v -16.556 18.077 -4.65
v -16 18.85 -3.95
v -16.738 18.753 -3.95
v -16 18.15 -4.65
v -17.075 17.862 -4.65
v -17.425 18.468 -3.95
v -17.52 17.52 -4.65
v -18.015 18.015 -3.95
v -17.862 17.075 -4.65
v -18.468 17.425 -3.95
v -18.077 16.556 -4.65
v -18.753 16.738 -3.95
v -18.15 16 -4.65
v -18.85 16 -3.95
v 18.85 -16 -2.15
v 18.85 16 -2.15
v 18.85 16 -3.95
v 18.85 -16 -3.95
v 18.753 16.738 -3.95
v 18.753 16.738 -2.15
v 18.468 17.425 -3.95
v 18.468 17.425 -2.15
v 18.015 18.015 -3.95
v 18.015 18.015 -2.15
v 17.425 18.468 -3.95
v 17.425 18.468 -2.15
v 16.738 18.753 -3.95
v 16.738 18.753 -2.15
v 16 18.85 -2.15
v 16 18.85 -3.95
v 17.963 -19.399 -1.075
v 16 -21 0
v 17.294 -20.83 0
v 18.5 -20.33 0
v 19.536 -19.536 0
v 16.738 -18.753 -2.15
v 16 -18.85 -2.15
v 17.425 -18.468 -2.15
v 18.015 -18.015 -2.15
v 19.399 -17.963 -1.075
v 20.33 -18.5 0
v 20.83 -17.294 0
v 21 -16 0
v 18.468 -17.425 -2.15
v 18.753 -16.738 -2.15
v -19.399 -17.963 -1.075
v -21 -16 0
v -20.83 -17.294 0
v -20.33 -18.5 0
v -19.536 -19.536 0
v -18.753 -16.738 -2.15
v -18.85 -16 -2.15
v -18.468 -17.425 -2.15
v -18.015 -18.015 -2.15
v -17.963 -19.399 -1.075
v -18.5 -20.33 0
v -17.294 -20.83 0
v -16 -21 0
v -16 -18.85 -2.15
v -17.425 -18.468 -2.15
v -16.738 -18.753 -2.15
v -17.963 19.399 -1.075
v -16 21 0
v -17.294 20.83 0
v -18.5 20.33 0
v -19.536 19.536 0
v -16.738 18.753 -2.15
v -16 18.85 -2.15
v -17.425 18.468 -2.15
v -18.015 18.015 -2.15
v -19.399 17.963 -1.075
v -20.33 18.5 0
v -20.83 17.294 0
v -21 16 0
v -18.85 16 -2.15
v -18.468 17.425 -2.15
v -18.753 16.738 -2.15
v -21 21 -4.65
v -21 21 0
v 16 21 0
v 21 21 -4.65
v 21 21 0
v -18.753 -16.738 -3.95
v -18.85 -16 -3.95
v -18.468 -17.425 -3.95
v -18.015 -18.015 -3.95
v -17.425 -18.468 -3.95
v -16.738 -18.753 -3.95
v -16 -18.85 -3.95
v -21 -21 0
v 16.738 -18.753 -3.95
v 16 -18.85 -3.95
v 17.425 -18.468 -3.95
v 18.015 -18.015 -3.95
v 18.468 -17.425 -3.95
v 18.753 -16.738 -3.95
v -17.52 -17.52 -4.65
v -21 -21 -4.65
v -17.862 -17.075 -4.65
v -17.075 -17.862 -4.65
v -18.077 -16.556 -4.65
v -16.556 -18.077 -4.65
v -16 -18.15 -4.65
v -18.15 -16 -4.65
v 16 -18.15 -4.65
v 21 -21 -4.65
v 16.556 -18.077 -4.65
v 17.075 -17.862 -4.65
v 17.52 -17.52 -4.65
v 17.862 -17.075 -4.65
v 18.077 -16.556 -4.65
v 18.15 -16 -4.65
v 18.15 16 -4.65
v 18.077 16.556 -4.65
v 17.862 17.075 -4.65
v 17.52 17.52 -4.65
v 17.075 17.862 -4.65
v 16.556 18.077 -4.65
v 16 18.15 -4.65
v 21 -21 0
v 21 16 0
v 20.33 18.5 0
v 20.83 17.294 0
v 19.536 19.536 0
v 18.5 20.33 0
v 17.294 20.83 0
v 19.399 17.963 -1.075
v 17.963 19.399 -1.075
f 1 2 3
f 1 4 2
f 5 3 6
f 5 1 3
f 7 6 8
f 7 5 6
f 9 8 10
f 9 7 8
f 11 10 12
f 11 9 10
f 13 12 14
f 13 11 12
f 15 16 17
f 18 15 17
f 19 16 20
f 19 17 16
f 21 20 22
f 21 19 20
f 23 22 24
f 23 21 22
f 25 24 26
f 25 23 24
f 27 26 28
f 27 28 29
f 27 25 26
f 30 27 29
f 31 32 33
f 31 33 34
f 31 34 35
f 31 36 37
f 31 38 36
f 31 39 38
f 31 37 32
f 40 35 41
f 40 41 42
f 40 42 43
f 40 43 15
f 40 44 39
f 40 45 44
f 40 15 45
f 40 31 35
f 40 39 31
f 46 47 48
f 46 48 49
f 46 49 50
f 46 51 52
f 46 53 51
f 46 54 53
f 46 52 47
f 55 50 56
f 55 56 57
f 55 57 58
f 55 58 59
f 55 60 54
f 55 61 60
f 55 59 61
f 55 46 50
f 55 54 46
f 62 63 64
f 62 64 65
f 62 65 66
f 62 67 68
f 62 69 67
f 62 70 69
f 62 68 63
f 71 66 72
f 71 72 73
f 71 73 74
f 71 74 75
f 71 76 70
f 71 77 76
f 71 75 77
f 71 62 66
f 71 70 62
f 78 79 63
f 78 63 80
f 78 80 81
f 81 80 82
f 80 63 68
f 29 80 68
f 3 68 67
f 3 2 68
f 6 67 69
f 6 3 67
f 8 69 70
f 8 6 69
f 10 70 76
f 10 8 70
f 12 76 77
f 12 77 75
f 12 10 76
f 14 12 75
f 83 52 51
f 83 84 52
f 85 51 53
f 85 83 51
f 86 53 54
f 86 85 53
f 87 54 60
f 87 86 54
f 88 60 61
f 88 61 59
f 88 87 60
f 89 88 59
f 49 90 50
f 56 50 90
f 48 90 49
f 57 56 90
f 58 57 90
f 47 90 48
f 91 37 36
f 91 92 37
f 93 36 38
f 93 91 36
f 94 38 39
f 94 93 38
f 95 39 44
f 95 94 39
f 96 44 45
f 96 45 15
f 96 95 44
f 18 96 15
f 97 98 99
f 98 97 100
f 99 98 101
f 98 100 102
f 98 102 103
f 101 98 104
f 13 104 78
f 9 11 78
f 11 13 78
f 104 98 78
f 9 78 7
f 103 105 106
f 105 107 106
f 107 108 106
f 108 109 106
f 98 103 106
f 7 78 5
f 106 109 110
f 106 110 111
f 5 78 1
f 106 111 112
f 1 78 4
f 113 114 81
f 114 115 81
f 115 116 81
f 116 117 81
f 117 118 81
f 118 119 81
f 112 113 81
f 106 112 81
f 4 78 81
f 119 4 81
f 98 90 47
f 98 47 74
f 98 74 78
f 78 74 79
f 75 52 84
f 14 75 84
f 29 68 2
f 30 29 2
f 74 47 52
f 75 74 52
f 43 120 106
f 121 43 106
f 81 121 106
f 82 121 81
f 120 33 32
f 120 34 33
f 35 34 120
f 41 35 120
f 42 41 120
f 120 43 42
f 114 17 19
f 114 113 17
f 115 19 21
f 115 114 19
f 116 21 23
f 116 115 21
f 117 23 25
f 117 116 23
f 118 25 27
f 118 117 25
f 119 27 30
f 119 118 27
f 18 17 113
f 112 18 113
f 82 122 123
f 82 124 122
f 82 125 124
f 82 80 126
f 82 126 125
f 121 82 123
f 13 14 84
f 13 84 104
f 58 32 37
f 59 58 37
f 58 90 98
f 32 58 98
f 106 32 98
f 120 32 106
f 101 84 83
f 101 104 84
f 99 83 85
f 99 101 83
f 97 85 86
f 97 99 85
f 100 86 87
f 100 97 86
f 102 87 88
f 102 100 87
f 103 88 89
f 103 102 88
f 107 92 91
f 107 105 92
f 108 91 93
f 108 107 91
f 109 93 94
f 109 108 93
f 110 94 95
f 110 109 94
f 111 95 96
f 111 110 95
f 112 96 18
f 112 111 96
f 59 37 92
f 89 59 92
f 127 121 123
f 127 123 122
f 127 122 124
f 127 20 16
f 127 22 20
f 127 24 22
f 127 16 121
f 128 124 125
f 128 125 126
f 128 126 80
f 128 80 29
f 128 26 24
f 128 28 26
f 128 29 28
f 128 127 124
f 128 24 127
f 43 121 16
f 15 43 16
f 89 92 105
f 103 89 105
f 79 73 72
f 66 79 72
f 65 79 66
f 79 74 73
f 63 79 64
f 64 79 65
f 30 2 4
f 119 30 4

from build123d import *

# Parameters (mm, degrees)
SKETCH001_W = 42
SKETCH001_H = 42
PAD_DEPTH   = 4.65


with BuildPart() as part:
    # Sketch001 → Pad (new body)
    with BuildSketch(Plane.XY):
        Rectangle(SKETCH001_W, SKETCH001_H)
        with BuildLine():
            Line((-16, -18.15), (16, -18.15))
            ThreePointArc((16, -18.15), (17.52028, -17.52028), (18.15, -16))
            Line((18.15, -16), (18.15, 16))
            ThreePointArc((18.15, 16), (17.52028, 17.52028), (16, 18.15))
            Line((16, 18.15), (-16, 18.15))
            ThreePointArc((-16, 18.15), (-17.52028, 17.52028), (-18.15, 16))
            Line((-18.15, 16), (-18.15, -16))
            ThreePointArc((-18.15, -16), (-17.52028, -17.52028), (-16, -18.15))
        make_face(mode=Mode.SUBTRACT)
    extrude(amount=-PAD_DEPTH)

    # SubtractivePipe: sweep along a path in Sketch002
    with BuildLine(Plane.XY) as subtractivepipe_path:
        Line((-16, -21), (16, -21))
        ThreePointArc((16, -21), (19.535534, -19.535534), (21, -16))
        Line((21, -16), (21, 16))
        ThreePointArc((21, 16), (19.535534, 19.535534), (16, 21))
        Line((16, 21), (-16, 21))
        ThreePointArc((-16, 21), (-19.535534, 19.535534), (-21, 16))
        Line((-21, 16), (-21, -16))
        ThreePointArc((-21, -16), (-19.535534, -19.535534), (-16, -21))
    # Sketch → SubtractivePipe (sweep, cut)
    with BuildSketch(Plane.XZ):
        Polygon((-21, 0), (-18.85, -2.15), (-18.85, -3.95), (-18.15, -4.65), (-18.15, 0), align=None)
    sweep(path=subtractivepipe_path.line, mode=Mode.SUBTRACT)


solid = part.part
